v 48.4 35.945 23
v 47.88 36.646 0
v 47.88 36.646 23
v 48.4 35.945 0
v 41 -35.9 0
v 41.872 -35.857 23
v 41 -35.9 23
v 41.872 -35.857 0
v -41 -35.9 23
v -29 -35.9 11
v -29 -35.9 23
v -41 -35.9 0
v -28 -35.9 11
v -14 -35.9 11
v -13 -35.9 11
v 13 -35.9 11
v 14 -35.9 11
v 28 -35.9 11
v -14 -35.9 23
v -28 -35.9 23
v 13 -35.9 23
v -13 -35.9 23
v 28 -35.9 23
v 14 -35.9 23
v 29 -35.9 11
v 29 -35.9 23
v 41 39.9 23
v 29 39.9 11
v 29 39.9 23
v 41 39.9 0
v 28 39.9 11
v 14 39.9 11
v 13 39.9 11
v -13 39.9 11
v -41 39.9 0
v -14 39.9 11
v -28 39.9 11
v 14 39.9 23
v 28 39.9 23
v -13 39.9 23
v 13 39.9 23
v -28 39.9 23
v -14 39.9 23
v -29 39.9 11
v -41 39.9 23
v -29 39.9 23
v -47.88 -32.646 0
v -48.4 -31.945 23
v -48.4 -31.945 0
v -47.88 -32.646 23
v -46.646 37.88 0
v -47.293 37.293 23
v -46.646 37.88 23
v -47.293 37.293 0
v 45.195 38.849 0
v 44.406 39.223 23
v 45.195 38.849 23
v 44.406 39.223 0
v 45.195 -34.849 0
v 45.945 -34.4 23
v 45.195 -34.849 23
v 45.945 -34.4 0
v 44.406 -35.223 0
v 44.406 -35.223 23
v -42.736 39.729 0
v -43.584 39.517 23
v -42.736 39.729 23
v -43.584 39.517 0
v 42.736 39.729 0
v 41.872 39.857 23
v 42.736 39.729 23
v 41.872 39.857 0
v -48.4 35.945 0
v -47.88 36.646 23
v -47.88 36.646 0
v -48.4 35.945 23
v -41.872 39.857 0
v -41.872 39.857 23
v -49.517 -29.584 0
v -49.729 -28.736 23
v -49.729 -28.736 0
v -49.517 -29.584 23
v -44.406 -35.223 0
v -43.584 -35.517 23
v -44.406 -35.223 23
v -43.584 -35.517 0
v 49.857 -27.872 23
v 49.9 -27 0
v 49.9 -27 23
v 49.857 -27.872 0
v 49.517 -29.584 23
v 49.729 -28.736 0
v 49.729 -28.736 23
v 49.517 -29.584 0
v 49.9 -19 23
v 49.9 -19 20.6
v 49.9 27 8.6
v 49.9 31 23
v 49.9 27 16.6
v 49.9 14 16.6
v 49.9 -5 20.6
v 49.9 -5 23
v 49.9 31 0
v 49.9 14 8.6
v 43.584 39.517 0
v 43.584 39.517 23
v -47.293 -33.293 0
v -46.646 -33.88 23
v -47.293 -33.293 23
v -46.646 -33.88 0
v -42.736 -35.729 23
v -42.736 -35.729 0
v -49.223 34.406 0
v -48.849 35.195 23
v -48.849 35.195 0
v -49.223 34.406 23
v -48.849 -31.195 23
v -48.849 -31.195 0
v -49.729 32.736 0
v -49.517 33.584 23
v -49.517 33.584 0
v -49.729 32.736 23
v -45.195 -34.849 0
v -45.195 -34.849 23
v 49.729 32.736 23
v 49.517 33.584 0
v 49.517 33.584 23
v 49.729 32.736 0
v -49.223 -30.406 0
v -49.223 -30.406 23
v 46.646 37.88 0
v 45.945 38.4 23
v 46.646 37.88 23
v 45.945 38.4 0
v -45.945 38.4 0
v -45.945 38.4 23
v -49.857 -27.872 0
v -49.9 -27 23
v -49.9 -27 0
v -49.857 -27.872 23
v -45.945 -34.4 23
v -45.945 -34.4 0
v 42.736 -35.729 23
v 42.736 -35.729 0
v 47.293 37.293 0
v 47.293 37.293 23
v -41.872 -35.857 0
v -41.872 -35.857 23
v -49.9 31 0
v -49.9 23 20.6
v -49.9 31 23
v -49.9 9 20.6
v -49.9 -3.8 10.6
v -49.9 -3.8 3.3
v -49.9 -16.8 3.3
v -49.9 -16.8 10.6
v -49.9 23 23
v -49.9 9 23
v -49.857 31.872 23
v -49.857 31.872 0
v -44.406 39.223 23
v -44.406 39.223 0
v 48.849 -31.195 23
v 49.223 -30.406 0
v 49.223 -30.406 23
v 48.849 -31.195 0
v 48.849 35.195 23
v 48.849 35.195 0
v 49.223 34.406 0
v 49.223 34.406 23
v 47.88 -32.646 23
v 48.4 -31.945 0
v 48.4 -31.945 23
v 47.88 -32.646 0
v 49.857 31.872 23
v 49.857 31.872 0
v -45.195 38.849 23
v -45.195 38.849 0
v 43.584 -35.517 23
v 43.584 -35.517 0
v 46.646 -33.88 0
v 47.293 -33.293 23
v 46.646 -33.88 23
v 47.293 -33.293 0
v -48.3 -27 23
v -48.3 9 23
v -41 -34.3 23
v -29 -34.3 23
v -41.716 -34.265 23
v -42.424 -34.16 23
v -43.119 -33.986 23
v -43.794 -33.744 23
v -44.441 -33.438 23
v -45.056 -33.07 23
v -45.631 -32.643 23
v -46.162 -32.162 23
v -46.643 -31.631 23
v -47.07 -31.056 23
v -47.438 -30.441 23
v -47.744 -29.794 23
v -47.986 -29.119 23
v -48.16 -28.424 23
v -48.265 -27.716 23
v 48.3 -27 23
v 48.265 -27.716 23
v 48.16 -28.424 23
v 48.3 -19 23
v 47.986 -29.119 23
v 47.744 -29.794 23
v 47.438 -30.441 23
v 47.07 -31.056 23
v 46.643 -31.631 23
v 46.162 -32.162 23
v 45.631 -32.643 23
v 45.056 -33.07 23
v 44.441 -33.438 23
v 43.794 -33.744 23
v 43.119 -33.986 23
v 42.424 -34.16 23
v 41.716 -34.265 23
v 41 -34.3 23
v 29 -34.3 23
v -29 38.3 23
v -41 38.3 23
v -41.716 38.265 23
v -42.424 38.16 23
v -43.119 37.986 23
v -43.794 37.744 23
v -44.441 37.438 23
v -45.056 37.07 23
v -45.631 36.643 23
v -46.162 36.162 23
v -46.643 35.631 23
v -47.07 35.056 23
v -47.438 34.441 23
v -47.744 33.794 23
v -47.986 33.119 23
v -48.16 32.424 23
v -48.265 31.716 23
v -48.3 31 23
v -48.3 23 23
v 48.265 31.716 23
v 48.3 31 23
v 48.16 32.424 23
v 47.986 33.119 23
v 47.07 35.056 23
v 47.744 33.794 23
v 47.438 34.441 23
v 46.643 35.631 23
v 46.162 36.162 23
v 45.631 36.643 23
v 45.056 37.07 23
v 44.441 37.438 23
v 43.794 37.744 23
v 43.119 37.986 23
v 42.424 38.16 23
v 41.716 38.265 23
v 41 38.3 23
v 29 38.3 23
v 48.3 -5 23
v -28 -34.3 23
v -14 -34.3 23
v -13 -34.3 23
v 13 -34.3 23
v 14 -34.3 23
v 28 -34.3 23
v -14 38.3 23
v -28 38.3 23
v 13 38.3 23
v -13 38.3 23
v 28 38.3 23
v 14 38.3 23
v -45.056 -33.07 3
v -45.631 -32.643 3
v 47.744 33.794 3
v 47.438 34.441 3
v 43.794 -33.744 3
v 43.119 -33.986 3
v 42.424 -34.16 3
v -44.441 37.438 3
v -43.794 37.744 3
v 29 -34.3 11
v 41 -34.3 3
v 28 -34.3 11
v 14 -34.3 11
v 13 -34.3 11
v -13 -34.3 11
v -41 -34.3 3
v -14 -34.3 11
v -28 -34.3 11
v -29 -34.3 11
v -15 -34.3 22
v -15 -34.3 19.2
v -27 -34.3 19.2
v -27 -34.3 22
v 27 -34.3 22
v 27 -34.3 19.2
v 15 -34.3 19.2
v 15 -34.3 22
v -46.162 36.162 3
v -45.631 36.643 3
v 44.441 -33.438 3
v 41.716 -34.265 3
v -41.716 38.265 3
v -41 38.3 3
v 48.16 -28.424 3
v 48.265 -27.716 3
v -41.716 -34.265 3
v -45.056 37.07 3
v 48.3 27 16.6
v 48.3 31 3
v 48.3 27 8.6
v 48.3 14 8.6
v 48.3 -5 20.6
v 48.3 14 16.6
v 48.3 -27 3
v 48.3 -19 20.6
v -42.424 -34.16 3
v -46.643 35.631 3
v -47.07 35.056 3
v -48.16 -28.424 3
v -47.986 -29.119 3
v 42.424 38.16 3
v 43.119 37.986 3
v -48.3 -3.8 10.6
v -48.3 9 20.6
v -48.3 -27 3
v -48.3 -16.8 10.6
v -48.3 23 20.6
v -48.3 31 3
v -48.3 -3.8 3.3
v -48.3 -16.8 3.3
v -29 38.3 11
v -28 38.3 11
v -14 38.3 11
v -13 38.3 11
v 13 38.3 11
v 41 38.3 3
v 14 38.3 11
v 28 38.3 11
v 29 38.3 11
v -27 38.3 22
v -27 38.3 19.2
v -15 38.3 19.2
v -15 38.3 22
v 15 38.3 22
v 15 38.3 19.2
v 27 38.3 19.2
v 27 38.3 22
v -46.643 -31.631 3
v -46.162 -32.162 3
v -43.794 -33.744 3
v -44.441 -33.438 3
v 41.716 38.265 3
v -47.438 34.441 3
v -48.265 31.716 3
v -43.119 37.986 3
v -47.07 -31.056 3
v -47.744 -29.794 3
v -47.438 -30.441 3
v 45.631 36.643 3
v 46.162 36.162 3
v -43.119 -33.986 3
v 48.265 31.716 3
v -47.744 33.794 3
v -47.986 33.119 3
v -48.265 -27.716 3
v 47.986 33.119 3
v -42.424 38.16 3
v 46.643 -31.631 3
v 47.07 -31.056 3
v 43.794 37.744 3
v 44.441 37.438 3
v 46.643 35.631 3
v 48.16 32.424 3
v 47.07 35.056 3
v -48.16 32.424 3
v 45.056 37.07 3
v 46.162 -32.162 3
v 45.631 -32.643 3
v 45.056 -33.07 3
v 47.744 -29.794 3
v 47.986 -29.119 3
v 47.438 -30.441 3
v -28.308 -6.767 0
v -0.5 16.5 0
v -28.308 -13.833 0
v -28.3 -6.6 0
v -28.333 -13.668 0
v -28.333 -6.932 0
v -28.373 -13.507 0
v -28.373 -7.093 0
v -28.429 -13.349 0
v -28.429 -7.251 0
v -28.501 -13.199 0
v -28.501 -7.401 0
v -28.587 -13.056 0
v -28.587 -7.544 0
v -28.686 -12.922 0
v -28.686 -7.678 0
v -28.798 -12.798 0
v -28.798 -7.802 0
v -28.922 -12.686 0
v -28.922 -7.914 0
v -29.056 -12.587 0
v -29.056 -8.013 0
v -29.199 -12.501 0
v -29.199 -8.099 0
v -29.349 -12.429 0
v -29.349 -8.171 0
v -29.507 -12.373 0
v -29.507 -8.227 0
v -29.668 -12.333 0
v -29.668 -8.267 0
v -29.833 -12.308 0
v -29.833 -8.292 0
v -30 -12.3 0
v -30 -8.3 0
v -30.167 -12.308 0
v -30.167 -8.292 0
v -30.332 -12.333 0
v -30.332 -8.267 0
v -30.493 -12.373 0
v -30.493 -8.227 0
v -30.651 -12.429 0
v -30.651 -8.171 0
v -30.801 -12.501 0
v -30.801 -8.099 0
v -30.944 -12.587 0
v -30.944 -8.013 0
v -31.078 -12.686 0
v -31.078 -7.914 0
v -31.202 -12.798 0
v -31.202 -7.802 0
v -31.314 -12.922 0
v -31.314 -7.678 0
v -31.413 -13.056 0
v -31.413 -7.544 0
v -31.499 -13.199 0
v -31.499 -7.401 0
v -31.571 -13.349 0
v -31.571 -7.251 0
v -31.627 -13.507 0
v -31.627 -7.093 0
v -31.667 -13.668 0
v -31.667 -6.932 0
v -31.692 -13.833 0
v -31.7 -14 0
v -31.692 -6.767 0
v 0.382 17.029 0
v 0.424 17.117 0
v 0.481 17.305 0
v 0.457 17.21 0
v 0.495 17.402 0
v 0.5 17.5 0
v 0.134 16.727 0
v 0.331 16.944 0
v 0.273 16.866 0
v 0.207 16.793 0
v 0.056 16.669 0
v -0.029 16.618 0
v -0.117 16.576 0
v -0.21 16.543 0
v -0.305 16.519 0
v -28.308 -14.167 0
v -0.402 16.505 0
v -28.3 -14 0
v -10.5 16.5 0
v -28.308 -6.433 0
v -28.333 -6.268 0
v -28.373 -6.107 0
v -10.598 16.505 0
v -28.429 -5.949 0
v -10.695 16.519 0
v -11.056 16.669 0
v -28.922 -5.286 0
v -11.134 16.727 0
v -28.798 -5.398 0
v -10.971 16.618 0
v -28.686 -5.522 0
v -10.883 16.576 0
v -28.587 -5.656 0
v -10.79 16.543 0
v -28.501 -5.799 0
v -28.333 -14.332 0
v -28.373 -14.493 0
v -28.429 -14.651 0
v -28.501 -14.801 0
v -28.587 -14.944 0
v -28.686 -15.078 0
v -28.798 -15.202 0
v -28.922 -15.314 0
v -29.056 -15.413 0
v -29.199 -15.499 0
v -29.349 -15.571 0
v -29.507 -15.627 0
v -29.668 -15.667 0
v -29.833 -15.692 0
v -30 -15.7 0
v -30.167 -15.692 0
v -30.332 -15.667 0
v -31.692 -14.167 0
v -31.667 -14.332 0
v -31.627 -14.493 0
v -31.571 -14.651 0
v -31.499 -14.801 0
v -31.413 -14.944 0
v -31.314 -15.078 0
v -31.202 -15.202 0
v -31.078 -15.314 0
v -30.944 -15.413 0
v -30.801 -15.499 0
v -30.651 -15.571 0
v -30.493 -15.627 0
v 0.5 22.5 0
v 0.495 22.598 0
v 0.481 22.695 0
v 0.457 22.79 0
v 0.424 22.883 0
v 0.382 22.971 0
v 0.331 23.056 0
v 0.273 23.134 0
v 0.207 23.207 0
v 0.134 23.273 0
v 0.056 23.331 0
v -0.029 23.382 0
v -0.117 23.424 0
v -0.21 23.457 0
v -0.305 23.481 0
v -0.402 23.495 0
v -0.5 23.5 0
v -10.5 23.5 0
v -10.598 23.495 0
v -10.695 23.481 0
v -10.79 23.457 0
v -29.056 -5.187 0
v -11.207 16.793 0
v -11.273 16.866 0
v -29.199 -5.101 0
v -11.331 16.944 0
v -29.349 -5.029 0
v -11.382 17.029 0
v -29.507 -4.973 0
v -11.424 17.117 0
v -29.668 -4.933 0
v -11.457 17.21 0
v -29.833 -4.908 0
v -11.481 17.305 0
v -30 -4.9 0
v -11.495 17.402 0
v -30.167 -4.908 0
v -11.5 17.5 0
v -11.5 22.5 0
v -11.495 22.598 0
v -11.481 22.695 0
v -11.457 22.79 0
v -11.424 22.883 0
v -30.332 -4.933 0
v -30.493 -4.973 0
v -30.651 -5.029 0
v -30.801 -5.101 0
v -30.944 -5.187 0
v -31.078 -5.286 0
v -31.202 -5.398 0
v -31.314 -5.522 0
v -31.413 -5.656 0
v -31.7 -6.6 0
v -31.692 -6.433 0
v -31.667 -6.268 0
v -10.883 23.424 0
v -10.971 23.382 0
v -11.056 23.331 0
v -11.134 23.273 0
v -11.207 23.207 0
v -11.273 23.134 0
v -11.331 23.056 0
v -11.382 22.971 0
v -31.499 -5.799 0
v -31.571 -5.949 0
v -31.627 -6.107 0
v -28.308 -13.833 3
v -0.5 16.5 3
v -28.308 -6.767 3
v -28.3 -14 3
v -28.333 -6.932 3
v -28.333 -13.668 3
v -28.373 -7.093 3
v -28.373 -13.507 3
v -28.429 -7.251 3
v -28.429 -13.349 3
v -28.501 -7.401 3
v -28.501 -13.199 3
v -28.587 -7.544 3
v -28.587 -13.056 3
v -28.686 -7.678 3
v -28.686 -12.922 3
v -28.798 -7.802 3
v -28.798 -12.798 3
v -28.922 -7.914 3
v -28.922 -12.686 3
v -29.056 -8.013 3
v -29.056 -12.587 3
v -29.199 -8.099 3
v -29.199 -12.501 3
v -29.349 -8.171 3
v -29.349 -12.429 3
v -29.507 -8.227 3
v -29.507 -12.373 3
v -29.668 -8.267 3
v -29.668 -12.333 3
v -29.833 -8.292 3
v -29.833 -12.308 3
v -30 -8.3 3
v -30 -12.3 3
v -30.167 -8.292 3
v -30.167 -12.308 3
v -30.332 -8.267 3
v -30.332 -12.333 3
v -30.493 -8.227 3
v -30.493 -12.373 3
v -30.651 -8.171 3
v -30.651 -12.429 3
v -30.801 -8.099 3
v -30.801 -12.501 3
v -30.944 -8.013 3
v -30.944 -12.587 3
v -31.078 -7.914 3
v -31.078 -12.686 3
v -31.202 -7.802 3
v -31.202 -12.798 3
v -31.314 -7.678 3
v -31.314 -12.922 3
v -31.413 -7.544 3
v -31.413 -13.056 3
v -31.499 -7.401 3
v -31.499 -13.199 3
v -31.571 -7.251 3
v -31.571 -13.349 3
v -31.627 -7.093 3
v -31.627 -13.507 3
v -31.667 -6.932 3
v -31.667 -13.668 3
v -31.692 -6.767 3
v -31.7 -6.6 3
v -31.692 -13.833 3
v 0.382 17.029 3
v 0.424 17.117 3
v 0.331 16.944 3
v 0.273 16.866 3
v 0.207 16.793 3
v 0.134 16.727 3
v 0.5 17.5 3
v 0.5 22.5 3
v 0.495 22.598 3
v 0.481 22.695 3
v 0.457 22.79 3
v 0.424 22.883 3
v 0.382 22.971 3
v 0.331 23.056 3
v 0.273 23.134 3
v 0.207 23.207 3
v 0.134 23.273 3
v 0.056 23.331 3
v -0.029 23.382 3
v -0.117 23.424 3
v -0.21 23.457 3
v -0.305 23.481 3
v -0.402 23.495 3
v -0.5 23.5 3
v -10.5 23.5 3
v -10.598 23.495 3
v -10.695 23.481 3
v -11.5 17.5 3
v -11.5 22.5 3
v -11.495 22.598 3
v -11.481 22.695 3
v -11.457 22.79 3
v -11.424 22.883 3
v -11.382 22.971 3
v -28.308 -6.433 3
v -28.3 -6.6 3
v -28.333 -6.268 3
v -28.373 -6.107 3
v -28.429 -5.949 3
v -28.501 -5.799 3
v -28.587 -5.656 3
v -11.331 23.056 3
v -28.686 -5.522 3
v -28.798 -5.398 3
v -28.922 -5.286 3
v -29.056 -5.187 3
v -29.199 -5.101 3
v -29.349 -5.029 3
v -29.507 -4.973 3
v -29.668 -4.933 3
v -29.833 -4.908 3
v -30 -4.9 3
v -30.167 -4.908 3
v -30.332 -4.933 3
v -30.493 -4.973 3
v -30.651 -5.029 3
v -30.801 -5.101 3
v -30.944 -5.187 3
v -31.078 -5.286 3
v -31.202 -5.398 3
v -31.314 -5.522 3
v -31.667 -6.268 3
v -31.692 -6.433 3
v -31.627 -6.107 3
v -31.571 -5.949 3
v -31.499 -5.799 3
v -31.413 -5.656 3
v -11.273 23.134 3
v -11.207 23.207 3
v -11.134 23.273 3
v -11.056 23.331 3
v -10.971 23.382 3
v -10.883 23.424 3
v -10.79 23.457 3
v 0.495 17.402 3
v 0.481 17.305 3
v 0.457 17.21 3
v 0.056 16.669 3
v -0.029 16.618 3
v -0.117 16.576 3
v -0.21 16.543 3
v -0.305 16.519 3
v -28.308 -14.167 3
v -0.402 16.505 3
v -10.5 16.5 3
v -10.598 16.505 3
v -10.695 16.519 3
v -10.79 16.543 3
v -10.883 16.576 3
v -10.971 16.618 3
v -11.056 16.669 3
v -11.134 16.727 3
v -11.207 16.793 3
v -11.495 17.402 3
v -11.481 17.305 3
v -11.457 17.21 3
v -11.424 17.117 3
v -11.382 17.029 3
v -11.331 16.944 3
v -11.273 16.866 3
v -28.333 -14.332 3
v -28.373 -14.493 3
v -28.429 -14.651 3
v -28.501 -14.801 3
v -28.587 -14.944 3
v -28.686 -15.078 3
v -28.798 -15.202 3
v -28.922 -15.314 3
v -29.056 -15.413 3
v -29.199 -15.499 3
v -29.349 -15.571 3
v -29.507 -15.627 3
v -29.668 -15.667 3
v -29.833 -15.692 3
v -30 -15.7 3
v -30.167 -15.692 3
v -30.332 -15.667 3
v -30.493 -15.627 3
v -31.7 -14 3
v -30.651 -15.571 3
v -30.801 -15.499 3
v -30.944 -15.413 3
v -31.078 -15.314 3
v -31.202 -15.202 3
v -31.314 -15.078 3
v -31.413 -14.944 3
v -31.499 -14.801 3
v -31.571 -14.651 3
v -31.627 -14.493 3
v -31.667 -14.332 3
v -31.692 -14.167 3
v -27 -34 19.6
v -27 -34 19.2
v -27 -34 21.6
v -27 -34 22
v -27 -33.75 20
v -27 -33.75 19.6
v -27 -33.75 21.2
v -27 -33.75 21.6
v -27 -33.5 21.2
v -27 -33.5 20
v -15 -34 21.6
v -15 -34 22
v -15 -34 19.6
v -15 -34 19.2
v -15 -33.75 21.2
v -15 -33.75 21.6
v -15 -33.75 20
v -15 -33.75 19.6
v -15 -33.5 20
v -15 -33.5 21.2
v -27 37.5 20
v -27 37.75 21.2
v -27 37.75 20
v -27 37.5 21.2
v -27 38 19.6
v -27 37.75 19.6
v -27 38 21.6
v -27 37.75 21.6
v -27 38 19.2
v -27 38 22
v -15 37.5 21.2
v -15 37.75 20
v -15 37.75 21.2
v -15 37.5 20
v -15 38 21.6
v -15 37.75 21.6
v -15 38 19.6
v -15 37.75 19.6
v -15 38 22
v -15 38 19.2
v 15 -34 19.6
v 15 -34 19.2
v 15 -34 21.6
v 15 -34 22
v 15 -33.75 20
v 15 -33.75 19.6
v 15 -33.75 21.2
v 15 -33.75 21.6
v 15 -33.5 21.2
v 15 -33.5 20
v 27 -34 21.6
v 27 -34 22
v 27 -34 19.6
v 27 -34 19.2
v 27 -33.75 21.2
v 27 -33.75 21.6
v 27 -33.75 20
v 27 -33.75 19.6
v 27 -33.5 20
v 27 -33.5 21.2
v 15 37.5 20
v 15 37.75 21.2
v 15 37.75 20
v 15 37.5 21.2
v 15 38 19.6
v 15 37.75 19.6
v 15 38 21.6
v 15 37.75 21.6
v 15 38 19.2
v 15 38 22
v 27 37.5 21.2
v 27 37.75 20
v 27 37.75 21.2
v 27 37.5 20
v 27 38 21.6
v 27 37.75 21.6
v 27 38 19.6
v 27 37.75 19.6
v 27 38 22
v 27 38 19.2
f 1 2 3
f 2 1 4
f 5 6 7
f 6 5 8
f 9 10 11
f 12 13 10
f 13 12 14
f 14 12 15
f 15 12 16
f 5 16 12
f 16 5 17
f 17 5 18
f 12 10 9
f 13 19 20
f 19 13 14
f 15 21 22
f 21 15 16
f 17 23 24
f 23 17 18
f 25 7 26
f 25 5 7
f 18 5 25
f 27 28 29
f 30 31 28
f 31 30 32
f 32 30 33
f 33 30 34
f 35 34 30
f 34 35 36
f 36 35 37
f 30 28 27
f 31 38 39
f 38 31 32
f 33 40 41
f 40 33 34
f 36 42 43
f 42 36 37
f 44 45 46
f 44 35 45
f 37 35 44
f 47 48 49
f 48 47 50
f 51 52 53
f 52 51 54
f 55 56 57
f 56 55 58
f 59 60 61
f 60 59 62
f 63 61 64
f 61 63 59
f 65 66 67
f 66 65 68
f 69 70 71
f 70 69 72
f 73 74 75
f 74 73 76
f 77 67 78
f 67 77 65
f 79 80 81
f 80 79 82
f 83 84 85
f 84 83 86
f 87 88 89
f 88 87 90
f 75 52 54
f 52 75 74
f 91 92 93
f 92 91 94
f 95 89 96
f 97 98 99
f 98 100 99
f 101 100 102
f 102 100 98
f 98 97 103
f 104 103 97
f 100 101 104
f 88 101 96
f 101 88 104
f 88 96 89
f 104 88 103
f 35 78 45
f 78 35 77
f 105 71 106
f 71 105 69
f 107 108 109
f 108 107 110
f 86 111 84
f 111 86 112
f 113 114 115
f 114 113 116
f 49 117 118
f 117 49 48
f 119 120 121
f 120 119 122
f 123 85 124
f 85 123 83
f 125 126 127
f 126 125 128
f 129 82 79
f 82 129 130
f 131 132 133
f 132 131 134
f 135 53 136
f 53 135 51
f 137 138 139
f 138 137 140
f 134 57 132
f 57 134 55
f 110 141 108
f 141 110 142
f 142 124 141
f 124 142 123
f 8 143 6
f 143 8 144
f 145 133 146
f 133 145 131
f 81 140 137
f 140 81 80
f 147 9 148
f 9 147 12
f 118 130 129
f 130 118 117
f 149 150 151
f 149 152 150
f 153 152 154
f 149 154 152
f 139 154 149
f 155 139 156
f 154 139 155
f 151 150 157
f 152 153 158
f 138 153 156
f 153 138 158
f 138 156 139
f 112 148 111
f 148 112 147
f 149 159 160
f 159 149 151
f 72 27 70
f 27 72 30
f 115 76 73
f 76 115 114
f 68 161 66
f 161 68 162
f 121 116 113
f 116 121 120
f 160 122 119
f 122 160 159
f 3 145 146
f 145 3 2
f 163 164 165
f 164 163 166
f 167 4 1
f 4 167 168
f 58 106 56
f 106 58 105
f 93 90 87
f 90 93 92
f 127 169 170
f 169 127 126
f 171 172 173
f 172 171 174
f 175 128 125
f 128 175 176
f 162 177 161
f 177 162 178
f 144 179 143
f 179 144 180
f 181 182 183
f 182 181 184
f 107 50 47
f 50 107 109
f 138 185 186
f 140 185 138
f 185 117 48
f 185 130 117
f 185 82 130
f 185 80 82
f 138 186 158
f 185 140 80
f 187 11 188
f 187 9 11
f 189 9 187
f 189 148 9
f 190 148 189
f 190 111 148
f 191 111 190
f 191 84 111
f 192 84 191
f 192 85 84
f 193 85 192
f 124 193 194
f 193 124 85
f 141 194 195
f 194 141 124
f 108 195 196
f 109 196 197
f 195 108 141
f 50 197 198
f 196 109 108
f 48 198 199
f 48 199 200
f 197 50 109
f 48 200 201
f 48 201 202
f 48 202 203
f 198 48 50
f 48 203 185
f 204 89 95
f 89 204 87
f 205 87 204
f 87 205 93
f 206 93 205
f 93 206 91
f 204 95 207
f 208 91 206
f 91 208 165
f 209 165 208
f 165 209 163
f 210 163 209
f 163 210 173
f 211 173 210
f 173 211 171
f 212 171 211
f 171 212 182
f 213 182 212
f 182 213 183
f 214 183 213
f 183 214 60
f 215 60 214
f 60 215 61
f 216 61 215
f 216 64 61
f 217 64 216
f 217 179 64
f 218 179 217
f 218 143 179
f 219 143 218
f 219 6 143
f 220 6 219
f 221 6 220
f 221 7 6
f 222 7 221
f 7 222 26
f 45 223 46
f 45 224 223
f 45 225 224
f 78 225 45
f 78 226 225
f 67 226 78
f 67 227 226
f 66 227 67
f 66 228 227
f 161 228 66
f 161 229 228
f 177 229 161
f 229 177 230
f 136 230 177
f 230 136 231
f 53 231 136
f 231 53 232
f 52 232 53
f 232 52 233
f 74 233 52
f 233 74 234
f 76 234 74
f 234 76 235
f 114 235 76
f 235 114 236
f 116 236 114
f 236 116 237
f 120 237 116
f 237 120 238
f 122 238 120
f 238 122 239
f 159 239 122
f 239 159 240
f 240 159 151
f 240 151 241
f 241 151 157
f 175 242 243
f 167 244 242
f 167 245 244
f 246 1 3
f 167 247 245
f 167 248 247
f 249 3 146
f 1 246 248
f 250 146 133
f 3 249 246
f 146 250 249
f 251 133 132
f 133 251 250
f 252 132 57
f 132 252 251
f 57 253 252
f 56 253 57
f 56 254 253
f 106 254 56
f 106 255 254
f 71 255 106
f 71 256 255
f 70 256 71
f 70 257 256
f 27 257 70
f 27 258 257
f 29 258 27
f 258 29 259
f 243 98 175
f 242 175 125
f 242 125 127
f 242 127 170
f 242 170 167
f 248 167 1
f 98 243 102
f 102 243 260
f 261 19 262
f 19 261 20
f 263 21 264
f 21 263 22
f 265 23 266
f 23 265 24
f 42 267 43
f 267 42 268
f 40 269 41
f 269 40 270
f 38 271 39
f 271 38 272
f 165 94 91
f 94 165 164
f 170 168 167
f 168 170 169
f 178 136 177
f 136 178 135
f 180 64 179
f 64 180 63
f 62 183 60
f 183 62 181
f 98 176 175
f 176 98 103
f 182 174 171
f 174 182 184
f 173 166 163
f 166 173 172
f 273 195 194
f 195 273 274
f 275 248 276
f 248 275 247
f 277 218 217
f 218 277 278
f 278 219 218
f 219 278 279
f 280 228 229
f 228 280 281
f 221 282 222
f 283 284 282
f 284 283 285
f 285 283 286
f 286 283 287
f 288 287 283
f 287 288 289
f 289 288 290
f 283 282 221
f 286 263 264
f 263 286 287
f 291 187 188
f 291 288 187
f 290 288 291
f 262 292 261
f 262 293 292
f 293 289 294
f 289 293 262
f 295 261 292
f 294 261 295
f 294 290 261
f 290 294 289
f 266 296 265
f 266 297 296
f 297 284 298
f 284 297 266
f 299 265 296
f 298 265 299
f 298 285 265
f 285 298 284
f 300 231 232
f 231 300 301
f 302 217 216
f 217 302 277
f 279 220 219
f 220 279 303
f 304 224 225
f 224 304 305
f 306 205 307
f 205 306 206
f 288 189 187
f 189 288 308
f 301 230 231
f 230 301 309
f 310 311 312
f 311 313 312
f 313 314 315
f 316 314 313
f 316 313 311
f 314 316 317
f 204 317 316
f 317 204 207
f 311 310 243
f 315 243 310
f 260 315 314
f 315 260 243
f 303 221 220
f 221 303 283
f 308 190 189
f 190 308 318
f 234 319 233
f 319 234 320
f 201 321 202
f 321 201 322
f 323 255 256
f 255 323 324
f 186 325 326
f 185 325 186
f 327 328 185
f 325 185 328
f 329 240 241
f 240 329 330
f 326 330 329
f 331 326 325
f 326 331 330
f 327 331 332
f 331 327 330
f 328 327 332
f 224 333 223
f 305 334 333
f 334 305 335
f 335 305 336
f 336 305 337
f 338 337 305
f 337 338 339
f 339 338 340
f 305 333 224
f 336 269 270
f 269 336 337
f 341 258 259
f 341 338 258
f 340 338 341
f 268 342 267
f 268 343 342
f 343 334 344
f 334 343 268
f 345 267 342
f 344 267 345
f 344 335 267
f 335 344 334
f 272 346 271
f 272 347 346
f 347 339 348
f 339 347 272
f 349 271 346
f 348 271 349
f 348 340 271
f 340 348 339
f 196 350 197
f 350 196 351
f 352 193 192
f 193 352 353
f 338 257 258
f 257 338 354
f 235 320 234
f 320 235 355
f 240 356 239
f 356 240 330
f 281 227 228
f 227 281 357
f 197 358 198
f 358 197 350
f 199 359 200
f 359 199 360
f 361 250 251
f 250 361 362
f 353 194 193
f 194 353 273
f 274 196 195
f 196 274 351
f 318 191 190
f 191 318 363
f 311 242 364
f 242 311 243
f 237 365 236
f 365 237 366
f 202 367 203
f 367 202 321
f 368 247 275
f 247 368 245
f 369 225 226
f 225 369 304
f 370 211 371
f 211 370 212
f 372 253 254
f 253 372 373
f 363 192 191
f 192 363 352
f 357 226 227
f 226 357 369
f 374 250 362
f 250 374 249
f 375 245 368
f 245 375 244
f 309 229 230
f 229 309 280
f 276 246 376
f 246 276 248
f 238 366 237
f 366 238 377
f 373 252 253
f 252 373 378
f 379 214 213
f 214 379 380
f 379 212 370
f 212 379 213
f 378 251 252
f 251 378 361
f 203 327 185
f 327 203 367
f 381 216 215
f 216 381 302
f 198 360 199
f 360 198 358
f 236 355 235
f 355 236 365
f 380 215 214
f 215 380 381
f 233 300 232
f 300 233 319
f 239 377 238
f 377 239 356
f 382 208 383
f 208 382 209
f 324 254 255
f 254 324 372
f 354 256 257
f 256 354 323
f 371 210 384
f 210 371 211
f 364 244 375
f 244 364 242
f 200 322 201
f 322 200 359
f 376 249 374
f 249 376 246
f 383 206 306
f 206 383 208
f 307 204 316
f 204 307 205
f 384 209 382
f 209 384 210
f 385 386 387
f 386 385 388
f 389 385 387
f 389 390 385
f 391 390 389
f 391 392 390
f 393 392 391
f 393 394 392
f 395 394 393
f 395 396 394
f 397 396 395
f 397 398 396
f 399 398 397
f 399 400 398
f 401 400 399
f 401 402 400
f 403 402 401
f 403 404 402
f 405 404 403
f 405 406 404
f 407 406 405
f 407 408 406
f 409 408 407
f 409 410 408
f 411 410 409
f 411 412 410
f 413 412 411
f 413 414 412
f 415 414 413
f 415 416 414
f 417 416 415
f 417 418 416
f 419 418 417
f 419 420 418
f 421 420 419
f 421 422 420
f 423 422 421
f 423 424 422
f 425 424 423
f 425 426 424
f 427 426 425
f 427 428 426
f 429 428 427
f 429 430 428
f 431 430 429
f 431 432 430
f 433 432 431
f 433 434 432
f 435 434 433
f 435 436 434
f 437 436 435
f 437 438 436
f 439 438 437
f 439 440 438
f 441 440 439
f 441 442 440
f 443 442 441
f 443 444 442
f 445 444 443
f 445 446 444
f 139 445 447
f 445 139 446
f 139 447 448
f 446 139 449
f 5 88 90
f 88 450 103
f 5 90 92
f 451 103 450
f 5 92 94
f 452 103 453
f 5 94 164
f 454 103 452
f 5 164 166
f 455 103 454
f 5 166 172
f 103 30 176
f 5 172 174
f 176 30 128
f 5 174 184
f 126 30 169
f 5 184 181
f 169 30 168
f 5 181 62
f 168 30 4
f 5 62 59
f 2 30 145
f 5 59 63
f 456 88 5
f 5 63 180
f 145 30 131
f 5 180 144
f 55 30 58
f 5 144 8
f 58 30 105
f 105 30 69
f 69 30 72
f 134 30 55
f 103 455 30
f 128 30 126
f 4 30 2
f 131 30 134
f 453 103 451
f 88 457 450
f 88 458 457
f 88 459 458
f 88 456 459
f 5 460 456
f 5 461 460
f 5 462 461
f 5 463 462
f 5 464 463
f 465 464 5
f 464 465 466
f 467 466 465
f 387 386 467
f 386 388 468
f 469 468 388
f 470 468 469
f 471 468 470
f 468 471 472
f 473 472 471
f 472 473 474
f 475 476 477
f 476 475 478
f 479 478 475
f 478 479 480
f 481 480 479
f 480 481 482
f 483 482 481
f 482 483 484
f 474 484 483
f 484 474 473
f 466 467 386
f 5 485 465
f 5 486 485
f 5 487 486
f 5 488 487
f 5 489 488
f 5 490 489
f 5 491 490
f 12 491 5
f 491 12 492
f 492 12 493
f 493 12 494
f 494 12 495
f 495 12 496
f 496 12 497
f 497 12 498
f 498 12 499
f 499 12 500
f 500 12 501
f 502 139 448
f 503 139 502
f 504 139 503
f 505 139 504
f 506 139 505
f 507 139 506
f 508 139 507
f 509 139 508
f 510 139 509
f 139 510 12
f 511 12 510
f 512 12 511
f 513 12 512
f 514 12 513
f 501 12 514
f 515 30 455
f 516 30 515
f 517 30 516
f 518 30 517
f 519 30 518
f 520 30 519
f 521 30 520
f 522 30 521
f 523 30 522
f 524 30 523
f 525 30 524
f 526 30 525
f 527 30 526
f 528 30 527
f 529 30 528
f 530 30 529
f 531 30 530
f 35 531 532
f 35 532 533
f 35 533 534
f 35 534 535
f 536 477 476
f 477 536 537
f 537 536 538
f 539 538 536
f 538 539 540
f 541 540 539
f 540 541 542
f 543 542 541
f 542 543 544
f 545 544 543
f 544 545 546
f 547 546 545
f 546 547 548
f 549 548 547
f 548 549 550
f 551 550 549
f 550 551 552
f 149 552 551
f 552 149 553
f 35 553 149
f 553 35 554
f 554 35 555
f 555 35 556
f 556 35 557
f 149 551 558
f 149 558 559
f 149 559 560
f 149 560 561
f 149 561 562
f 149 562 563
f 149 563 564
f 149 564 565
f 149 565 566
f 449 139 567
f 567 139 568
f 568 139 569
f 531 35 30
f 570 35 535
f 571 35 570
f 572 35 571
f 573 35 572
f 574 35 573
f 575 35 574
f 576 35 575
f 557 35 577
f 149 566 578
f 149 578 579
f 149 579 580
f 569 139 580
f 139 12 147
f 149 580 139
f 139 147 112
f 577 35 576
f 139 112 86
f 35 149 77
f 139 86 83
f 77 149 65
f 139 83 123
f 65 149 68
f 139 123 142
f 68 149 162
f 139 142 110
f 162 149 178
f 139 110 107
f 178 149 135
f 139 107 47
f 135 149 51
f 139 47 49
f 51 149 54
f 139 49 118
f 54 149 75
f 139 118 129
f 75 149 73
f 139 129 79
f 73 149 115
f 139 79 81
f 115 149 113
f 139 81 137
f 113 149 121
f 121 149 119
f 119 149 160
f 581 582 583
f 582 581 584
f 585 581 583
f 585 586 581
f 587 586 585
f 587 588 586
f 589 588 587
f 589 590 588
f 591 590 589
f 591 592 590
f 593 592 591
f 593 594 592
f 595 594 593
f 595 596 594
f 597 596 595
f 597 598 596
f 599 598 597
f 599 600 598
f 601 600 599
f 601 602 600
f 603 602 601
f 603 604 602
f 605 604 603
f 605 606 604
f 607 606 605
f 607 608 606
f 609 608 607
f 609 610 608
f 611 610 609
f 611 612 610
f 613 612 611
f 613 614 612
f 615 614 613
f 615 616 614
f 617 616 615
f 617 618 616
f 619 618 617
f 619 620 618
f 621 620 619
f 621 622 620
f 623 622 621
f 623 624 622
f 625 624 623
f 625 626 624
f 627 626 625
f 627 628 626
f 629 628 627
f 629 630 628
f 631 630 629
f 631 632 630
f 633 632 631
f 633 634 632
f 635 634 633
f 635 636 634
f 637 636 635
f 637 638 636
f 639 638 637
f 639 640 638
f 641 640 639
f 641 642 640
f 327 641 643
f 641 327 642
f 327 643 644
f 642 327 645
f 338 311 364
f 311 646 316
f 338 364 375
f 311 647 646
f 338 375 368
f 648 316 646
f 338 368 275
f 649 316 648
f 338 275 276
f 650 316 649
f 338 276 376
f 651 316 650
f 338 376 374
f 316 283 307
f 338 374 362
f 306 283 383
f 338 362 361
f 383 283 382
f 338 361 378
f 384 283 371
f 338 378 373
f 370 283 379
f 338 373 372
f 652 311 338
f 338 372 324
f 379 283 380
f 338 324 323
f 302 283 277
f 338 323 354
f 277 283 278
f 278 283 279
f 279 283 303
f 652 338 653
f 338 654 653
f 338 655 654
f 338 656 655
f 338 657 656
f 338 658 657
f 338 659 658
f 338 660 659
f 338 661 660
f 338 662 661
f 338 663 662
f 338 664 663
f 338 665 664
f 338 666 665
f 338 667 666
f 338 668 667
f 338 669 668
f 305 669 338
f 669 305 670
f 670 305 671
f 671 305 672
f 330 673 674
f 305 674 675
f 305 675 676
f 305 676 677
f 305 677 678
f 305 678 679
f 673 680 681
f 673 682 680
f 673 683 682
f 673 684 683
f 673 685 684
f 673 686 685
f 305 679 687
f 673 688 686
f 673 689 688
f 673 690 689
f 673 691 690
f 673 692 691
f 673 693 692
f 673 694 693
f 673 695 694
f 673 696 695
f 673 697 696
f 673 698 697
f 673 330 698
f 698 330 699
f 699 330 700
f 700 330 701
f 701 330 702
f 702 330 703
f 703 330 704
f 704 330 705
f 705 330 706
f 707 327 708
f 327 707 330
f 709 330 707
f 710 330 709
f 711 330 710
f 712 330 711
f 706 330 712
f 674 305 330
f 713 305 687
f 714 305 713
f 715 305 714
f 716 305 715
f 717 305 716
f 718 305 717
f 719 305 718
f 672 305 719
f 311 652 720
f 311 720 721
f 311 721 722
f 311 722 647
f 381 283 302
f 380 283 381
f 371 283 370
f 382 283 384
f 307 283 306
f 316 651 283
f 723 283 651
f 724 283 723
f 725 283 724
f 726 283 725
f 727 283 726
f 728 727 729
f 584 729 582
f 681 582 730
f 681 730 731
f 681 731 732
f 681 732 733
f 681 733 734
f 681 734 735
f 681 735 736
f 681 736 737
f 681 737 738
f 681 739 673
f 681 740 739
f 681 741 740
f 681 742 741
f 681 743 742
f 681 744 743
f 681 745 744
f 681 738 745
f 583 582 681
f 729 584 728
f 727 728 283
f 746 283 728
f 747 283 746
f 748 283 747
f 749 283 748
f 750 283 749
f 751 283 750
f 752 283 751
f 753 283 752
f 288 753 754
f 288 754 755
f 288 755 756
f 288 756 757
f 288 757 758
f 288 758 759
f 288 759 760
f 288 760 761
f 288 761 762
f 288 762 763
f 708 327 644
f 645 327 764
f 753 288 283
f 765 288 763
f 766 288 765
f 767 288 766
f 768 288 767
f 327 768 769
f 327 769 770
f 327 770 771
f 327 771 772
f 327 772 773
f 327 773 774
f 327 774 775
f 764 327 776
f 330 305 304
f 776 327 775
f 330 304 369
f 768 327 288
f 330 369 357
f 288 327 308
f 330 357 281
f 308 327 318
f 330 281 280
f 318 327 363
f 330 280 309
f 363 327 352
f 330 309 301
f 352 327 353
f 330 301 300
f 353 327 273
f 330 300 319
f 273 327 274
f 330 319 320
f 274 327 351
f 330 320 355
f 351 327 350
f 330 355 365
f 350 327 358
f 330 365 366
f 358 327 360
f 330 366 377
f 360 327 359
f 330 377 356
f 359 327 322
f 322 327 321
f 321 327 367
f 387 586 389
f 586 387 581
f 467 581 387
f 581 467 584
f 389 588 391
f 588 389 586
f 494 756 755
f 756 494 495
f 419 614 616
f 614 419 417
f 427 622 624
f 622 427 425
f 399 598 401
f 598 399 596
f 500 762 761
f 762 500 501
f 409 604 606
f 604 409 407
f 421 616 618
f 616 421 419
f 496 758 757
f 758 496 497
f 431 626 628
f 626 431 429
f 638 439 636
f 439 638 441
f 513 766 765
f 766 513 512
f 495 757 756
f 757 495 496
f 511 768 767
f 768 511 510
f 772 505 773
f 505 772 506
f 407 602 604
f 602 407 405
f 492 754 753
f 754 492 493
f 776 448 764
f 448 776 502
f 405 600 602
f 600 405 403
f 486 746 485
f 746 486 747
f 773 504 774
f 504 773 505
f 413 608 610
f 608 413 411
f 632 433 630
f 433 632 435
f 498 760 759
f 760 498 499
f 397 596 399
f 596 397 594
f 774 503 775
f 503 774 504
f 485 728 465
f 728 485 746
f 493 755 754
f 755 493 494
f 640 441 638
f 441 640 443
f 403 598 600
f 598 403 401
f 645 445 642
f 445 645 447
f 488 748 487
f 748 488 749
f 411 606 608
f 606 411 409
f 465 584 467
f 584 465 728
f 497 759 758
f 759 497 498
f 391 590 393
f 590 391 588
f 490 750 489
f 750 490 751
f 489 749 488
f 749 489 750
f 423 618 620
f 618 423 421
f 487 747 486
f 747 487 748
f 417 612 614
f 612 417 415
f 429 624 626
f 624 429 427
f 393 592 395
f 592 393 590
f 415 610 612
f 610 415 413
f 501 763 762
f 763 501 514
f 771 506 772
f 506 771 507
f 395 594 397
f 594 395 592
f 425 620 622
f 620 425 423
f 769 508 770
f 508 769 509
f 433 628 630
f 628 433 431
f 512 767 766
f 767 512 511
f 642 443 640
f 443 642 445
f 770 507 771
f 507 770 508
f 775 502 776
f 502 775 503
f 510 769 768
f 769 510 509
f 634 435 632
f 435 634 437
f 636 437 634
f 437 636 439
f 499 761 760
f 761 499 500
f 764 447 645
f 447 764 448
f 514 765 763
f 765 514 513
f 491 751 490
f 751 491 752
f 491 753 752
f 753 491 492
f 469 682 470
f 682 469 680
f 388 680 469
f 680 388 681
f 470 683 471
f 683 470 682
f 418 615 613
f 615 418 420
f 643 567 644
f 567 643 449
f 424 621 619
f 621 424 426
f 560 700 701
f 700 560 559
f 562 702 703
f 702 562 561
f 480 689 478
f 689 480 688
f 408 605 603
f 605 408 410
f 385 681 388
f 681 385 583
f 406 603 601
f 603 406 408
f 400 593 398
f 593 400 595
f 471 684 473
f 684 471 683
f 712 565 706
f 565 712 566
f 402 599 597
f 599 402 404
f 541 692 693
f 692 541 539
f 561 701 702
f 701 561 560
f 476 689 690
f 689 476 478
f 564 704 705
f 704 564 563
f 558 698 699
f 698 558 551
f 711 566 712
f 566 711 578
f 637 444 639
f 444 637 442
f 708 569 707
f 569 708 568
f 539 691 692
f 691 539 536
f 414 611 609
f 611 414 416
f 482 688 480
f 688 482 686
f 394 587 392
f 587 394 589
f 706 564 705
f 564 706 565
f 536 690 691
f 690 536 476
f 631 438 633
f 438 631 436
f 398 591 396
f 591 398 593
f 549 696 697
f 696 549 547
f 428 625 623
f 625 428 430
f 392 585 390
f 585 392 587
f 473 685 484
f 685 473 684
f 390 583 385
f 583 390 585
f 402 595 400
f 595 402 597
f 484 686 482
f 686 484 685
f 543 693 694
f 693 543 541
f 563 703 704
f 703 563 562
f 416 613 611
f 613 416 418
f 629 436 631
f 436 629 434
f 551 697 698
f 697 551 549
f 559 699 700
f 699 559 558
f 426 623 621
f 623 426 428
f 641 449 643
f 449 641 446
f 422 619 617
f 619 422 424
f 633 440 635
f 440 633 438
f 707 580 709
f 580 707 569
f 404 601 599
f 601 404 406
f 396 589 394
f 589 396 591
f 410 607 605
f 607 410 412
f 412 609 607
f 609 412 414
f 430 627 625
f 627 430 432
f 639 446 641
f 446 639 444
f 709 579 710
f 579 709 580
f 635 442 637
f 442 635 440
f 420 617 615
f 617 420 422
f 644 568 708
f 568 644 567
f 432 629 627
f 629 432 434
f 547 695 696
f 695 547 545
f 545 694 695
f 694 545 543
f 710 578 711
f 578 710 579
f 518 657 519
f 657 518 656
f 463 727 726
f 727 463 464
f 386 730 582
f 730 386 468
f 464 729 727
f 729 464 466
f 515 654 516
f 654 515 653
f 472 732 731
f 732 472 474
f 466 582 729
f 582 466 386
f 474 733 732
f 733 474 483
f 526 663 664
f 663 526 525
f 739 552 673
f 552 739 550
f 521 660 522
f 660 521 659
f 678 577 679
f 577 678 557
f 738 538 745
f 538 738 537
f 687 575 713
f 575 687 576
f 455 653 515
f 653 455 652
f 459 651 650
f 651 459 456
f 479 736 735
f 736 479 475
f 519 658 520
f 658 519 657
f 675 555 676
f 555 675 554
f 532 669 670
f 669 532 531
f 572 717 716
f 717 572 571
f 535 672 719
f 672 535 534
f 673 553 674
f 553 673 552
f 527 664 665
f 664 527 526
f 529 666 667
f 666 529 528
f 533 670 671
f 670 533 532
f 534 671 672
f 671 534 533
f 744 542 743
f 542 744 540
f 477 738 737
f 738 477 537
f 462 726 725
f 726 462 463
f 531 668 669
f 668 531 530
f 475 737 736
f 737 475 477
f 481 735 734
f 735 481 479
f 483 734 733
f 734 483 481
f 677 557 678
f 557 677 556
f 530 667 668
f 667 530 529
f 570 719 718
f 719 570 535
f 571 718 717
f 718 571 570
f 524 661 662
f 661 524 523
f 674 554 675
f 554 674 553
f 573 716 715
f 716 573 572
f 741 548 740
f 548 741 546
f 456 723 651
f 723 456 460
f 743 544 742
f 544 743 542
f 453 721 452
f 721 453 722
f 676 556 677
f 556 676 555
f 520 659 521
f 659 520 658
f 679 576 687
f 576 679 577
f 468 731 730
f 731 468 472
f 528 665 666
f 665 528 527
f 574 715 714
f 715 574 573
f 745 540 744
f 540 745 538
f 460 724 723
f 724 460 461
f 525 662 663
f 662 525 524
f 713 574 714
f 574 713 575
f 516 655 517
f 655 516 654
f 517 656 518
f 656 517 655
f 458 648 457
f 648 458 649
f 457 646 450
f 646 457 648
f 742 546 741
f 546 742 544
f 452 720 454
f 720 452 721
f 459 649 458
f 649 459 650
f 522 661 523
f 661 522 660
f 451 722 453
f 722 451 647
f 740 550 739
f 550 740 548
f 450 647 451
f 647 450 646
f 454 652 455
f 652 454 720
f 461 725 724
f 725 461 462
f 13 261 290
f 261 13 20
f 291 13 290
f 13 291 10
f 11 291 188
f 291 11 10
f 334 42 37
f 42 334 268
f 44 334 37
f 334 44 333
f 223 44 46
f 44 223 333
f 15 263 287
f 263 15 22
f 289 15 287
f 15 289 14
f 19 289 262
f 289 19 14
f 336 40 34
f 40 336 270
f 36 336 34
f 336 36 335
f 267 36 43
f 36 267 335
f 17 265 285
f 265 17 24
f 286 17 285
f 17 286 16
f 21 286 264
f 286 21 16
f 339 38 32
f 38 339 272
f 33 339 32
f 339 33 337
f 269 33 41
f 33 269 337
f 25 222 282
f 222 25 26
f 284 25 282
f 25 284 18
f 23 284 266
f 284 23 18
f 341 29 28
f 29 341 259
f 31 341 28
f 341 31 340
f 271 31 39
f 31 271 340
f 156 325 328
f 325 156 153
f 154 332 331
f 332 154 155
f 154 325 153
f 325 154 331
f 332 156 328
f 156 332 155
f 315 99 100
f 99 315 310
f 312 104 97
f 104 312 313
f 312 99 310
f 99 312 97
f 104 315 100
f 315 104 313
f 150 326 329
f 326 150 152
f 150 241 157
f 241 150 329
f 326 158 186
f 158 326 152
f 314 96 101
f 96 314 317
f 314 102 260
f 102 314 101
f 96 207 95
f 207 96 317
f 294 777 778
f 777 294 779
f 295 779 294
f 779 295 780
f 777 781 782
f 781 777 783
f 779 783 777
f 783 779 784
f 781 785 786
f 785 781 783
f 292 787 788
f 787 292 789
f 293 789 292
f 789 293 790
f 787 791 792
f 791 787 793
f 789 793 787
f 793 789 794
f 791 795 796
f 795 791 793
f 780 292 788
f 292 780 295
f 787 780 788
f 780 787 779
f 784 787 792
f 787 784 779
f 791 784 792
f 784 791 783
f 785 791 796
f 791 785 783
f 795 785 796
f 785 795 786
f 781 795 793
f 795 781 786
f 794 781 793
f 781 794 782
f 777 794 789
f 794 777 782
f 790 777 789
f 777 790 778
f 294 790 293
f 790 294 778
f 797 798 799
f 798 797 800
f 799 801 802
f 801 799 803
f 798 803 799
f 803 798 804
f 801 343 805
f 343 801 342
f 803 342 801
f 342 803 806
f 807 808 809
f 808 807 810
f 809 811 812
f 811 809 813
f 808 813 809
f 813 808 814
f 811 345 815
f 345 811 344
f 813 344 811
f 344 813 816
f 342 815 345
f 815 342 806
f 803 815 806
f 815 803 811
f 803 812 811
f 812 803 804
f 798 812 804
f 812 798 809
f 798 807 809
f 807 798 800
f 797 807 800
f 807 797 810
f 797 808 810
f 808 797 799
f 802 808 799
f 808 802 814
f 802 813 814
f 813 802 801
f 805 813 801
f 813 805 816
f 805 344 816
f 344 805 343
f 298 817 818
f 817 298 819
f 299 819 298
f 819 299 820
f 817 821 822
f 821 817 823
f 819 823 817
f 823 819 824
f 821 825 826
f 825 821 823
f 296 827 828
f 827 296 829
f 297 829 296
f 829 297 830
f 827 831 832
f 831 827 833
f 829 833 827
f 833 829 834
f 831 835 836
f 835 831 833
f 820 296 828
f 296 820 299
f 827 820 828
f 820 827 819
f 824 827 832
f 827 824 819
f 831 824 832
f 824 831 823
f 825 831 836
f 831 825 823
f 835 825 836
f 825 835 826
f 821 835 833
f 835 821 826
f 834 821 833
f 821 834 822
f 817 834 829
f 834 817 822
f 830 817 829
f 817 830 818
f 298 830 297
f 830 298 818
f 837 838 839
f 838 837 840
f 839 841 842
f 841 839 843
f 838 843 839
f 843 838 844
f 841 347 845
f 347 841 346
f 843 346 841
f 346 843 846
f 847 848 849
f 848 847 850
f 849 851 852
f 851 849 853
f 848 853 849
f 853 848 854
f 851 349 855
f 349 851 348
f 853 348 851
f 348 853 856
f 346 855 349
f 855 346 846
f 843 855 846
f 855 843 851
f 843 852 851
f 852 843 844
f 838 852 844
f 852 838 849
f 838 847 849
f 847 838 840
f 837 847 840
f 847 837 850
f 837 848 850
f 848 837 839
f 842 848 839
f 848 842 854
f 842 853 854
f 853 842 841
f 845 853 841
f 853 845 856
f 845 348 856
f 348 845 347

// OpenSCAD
$fn = 64;

show_original = false;         
original_file = "tx_lid.stl"; 
// ---- Main shell ----
box_w   = 99.8;   // outer width  (X)
box_d   = 75.8;   // outer depth  (Y)
box_cy  = 2;      // Y of the box centre (not y=0)
corner_r = 8.9;   // outer corner radius
plate_t = 3;      // top plate thickness (z = 0 .. plate_t)
wall_t  = 1.6;    // side wall thickness
total_h = 23;     // overall height

// derived: edit the numbers above instead
in_w = box_w - 2*wall_t;   // inner width (96.6)
in_d = box_d - 2*wall_t;   // inner depth (72.6)
in_r = corner_r - wall_t;  // inner corner radius (7.3)

// ---- Holes in the top plate ----
sw_cx = -5.5;  sw_cy = 20;     // switch window centre
sw_w  = 12;    sw_d  = 7;      // switch window size
sw_r  = 1;                     // switch window corner radius
led_d = 3.4;                   // LED hole diameter
led_pos = [[-30, -14], [-30, -6.6]];  // LED hole centres

// ---- Openings in the side walls ----
// -X wall
left_y0 = -16.8;  left_y1 = -3.8;  left_z0 = 3.3;  left_z1 = 10.6;
// +X wall
right_y0 = 14;    right_y1 = 27;   right_z0 = 8.6; right_z1 = 16.6;
// top-edge notches (open to the top of the wall)
topL_y0 = 9;      topL_y1 = 23;    // -X wall
topR_y0 = -19;    topR_y1 = -5;    // +X wall
top_z0  = 20.6;

// ---- Snap tabs on the long (+/-Y) walls ----
slit_x = [-29, -14, 13, 28];  // X of each 1 mm slit (left edge)
slit_w = 1;
slit_z0 = 11;                 // slits run from here to the top

bump_x   = [[-27, -15], [15, 27]];  // X range of each latch bump (1 mm inside each tab edge)
// the bump is a 3-step staircase (up and down), heights measured inward from the wall
bump_h1 = 0.3;   // first / last step
bump_h2 = 0.55;  // second / fourth step
bump_h3 = 0.8;   // top step
bump_za = 19.2;  // z where each step starts/ends:
bump_zb = 19.6;
bump_zc = 20.0;
bump_zd = 21.2;
bump_ze = 21.6;
bump_zf = 22.0;

// ============================================================
module rrect2d(w, d, r) {
  offset(r = r) square([w - 2*r, d - 2*r], center = true);
}

module top_holes() {
  translate([sw_cx, sw_cy, -1])
    linear_extrude(height = plate_t + 2) rrect2d(sw_w, sw_d, sw_r);
  for (p = led_pos)
    translate([p[0], p[1], -1]) cylinder(d = led_d, h = plate_t + 2);
}

// wall opening on the -X (side=-1) or +X (side=+1) wall
module x_wall_cut(side, y0, y1, z0, z1) {
  translate([side > 0 ? in_w/2 - 0.5 : -box_w/2 - 0.5, y0, z0])
    cube([wall_t + 1, y1 - y0, z1 - z0]);
}

module y_slits() {
  for (x0 = slit_x) for (sy = [-1, 1])
    translate([x0,
               box_cy + (sy > 0 ? in_d/2 - 0.5 : -(box_d/2 + 0.5)),
               slit_z0])
      cube([slit_w, wall_t + 1, total_h + 0.1 - slit_z0]);
}

// latch bump on the inside of a +/-Y wall tab
module bump(x0, x1, sy) {
  yin = in_d/2;  // inner wall face, relative to box_cy
  translate([x0, box_cy, 0]) scale([1, sy, 1])
    rotate([90, 0, 90])
      linear_extrude(height = x1 - x0)
        polygon([
          [yin + 0.2,      bump_za],
          [yin - bump_h1,  bump_za],
          [yin - bump_h1,  bump_zb],
          [yin - bump_h2,  bump_zb],
          [yin - bump_h2,  bump_zc],
          [yin - bump_h3,  bump_zc],
          [yin - bump_h3,  bump_zd],
          [yin - bump_h2,  bump_zd],
          [yin - bump_h2,  bump_ze],
          [yin - bump_h1,  bump_ze],
          [yin - bump_h1,  bump_zf],
          [yin + 0.2,      bump_zf]
        ]);
}

// ============================================================
union() {
  difference() {
    union() {
      // top plate
      translate([0, box_cy, 0])
        linear_extrude(height = plate_t) rrect2d(box_w, box_d, corner_r);
      // side walls
      difference() {
        translate([0, box_cy, plate_t - 0.01])
          linear_extrude(height = total_h - plate_t + 0.01) rrect2d(box_w, box_d, corner_r);
        translate([0, box_cy, plate_t - 0.02])
          linear_extrude(height = total_h) rrect2d(in_w, in_d, in_r);
      }
    }
    top_holes();
    x_wall_cut(-1, left_y0,  left_y1,  left_z0,  left_z1);
    x_wall_cut( 1, right_y0, right_y1, right_z0, right_z1);
    x_wall_cut(-1, topL_y0,  topL_y1,  top_z0,   total_h + 0.1);
    x_wall_cut( 1, topR_y0,  topR_y1,  top_z0,   total_h + 0.1);
    y_slits();
  }
  for (b = bump_x) for (sy = [-1, 1]) bump(b[0], b[1], sy);
}

if (show_original) { %import(original_file); }
